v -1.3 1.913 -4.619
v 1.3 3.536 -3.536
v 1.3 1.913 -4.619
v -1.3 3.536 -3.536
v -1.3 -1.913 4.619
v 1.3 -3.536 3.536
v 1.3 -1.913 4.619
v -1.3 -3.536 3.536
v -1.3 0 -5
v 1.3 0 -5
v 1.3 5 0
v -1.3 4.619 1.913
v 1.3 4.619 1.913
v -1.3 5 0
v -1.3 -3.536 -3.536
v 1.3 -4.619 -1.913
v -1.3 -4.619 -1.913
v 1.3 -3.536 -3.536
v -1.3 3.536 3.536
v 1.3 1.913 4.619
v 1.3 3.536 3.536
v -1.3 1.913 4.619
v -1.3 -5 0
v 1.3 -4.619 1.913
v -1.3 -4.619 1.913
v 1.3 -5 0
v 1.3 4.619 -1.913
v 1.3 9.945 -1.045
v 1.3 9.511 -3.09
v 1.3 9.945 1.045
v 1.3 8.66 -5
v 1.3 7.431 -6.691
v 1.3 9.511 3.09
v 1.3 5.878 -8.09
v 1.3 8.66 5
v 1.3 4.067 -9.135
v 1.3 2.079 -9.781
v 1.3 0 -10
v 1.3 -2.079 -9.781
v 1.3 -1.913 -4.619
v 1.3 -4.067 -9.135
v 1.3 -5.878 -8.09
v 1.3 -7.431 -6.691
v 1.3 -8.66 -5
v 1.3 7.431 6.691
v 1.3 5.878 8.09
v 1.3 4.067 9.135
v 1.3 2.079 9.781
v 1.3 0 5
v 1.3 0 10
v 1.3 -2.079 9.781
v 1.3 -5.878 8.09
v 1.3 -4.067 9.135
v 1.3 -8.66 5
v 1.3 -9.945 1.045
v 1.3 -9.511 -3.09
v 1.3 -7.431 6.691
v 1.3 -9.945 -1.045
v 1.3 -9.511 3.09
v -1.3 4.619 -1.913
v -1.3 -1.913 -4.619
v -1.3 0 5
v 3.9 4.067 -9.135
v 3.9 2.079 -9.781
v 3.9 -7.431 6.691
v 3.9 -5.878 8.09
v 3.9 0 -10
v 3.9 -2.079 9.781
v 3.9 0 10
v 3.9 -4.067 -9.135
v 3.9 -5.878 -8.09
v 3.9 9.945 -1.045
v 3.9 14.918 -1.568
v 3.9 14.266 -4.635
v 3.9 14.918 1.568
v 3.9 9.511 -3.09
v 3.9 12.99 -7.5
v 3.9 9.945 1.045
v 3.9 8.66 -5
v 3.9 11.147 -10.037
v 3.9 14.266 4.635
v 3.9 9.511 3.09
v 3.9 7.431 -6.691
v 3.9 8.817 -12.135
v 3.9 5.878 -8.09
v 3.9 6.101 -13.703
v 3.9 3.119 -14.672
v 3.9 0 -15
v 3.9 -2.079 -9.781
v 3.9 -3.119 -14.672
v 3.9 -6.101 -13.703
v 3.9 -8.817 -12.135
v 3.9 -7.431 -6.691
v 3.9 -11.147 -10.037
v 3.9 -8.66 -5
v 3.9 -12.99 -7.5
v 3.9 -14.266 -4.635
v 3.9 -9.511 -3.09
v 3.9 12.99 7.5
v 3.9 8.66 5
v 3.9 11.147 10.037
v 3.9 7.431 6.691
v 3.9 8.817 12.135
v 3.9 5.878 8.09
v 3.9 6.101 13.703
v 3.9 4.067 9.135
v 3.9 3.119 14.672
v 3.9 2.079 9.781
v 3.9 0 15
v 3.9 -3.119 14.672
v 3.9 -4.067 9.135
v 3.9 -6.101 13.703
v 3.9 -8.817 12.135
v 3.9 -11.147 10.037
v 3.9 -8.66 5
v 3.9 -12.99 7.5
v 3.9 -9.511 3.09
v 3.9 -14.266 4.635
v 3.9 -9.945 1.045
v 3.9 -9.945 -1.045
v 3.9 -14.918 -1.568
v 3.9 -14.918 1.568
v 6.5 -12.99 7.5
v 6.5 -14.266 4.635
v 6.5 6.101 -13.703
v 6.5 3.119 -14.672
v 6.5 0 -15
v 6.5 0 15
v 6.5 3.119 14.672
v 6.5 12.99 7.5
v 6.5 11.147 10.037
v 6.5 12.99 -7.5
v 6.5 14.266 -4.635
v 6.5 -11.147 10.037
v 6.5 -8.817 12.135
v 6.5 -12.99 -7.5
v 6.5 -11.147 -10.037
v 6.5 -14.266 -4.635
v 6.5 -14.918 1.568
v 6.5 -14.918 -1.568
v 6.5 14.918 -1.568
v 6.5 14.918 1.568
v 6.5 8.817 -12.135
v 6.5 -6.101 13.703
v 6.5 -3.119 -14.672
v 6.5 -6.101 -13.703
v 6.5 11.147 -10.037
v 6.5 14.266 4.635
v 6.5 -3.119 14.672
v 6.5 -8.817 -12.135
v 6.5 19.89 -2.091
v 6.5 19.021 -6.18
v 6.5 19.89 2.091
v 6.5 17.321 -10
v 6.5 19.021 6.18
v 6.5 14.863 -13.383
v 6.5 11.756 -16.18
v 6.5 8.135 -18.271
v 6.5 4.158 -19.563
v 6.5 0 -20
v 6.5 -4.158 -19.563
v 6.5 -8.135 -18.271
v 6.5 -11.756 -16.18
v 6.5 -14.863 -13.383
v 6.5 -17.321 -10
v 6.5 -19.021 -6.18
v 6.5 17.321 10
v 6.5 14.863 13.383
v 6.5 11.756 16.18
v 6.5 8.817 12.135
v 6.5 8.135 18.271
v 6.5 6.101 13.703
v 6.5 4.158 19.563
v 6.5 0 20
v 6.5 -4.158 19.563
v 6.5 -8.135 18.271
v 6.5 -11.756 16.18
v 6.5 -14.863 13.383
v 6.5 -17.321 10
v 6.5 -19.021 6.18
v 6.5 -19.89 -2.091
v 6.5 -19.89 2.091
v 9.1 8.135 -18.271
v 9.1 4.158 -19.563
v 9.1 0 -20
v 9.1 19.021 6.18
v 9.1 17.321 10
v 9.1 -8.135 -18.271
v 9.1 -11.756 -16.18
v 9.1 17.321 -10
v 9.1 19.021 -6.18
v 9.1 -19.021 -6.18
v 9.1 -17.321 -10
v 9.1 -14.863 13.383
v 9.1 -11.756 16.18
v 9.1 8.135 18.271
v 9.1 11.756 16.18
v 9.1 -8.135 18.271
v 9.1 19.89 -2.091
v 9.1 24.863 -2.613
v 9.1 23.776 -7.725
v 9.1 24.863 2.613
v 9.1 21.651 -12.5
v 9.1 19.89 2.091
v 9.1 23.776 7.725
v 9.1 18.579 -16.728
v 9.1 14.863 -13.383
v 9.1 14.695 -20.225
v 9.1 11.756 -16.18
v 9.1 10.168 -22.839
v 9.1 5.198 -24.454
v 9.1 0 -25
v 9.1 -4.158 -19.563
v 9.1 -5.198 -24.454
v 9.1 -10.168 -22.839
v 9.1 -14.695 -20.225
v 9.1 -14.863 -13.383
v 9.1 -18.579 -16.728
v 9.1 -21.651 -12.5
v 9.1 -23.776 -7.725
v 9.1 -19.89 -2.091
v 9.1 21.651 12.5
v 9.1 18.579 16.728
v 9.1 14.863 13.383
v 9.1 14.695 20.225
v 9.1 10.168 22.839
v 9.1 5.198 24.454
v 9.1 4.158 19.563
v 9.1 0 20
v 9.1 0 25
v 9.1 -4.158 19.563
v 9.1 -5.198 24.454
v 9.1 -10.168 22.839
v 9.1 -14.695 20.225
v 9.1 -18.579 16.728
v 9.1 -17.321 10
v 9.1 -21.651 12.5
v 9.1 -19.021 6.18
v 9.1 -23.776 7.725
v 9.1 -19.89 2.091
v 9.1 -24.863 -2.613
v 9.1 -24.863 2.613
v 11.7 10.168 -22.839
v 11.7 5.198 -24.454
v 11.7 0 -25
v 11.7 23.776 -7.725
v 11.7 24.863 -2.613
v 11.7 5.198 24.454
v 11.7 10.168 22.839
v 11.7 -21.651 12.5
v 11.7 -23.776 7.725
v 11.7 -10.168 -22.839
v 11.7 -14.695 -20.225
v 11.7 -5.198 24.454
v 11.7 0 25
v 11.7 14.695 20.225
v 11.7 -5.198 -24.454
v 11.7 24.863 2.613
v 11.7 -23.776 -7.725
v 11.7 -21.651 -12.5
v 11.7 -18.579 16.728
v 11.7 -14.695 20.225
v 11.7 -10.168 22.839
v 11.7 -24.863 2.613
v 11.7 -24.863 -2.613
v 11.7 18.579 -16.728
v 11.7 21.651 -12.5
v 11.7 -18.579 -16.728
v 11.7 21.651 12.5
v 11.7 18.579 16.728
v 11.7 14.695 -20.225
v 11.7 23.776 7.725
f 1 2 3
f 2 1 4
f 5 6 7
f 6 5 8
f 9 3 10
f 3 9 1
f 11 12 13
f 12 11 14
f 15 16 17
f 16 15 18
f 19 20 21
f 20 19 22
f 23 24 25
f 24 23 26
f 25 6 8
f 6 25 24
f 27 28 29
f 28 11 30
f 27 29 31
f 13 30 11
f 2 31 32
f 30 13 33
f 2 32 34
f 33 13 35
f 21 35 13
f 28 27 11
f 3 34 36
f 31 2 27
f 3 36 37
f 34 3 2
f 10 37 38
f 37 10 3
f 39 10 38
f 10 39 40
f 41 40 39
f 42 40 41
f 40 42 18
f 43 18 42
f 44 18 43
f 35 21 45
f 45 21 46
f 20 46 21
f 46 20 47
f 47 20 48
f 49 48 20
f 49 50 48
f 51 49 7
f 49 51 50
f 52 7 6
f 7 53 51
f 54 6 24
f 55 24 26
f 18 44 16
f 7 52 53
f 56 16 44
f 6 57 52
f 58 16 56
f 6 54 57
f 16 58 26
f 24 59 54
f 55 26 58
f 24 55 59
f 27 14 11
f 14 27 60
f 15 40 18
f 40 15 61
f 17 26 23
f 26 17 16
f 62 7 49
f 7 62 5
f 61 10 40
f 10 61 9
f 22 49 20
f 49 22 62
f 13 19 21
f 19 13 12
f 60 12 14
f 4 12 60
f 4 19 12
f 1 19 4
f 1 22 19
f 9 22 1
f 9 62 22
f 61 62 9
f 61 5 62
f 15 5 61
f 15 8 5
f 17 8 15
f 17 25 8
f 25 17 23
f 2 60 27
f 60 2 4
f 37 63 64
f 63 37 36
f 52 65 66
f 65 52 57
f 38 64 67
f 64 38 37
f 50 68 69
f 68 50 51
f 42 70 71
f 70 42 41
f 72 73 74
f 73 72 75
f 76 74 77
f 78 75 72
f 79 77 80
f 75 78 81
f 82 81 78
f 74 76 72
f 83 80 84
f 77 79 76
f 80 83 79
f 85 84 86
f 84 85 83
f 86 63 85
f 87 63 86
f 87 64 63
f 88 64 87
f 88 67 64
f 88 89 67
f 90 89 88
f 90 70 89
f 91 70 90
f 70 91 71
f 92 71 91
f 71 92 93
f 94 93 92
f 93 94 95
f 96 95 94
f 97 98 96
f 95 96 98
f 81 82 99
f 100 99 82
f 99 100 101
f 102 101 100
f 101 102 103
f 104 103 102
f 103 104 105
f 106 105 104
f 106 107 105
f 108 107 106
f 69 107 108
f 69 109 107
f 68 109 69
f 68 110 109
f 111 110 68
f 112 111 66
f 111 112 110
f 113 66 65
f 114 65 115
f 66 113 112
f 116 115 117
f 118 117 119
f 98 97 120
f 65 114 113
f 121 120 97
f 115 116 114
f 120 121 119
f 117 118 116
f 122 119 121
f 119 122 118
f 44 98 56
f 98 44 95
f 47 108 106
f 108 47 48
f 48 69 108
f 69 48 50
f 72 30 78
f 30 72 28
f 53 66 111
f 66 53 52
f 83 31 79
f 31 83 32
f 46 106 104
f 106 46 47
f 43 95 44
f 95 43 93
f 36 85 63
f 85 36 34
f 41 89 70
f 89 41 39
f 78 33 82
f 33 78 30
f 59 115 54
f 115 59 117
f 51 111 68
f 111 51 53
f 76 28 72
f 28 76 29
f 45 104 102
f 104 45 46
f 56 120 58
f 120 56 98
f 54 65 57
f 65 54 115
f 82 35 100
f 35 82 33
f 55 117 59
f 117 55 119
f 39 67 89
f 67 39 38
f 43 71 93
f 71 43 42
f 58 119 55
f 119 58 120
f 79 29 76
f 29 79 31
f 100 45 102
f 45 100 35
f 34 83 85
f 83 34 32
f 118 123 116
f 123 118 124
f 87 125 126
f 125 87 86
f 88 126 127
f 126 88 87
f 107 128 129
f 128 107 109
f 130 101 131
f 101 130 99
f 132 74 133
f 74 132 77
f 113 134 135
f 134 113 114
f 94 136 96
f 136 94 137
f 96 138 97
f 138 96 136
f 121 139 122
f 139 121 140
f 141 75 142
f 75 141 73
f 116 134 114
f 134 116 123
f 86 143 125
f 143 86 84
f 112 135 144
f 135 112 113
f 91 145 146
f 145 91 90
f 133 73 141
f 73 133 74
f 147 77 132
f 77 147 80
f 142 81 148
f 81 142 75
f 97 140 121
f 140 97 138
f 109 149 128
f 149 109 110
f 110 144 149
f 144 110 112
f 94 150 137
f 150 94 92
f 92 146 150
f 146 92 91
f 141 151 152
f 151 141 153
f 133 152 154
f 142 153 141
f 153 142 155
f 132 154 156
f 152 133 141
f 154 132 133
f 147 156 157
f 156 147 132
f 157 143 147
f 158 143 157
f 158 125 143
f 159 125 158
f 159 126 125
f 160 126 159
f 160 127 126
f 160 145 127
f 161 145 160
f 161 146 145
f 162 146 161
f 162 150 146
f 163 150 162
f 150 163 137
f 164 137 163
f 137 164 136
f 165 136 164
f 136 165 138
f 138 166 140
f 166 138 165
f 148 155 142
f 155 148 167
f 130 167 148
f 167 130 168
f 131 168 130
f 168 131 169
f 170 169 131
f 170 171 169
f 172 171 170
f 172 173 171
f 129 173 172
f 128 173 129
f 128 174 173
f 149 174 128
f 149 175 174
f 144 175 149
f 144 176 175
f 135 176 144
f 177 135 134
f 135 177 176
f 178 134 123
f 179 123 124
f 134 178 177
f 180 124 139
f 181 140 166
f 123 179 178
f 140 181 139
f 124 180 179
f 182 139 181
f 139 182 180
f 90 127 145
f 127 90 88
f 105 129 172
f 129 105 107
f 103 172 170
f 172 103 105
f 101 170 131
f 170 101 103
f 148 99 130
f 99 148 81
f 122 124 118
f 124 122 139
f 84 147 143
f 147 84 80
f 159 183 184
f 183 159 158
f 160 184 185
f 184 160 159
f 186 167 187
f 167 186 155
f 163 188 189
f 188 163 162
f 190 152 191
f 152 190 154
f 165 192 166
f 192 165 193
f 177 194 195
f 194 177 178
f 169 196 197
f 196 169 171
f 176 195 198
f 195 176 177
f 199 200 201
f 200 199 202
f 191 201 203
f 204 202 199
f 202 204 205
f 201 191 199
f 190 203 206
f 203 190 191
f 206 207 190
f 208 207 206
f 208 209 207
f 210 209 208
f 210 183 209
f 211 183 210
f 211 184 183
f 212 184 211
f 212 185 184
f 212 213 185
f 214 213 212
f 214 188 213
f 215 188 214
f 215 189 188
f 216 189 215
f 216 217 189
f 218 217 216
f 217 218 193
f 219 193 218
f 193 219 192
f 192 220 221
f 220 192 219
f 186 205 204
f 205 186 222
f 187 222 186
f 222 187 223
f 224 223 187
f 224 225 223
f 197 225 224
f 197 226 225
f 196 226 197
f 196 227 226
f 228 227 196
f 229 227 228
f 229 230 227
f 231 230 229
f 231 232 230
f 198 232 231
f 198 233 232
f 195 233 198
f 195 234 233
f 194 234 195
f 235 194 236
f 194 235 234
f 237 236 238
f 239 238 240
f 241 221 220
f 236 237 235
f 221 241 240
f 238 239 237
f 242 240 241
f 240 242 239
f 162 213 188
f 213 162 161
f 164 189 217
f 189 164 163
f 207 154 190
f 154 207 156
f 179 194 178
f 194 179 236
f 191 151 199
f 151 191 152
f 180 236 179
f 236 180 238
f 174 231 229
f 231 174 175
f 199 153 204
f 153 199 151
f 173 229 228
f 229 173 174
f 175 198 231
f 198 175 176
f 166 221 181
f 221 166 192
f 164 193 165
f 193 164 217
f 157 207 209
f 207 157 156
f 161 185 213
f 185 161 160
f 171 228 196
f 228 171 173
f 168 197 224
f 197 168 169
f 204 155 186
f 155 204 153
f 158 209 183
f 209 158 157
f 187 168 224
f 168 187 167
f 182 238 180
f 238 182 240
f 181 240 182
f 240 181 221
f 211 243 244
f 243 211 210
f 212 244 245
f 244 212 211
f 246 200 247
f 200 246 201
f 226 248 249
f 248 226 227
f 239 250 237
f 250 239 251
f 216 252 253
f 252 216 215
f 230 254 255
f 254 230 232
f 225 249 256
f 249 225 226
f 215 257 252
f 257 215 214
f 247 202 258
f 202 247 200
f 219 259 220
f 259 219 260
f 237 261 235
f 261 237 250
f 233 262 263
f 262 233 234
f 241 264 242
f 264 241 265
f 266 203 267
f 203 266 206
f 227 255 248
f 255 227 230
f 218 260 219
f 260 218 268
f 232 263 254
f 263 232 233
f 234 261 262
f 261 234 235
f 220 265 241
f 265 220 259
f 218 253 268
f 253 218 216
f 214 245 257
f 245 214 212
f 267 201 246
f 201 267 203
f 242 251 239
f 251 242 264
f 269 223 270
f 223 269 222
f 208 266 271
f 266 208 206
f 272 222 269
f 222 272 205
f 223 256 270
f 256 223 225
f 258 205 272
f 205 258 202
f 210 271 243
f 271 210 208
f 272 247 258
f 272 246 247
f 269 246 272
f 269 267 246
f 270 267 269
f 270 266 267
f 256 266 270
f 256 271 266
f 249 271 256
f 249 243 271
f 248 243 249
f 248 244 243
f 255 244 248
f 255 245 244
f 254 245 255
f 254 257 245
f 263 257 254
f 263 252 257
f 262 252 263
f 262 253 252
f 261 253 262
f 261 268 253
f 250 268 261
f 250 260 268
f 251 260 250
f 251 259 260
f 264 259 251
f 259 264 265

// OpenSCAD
laserScale = 1;
$flatten = false;
$childNum = 1;
assembly($childNum,$flatten){
for($i=[0:4]){
    assembly($childNum,$flatten){
        laserCutLayer([$i*2.6,0,0], [0,90,0],2.6,$flatten){
            circle(r=5+5*$i,center = true);
        }
        
    }
}
}

module pass(){
    children();
}

pass()assembly($childNum,$flatten)circle(r=10);

module assembly(childNum=0,flatten=true){
   // echo($parent_modules);
   // echo(parent_module(1));
    for(i=[0:$children-1]){
        if(i==childNum || !flatten){
            children(i);
        }
    }
}

module laserCutLayer(trans = [0,0,0],rot = [0,0,0],thickness=2.6, flatten = false,visible = true){
    if(visible){
        if(flatten){
            scale([laserScale,laserScale,laserScale]){
                children();
            }
        }else{
            translate(trans){
                rotate(rot){
                    translate([0,0,-thickness/2]){
                        linear_extrude(height=thickness){
                            children();
                        }
                    }
                }
            }
        }
    }else{
        %children();
    }
}
